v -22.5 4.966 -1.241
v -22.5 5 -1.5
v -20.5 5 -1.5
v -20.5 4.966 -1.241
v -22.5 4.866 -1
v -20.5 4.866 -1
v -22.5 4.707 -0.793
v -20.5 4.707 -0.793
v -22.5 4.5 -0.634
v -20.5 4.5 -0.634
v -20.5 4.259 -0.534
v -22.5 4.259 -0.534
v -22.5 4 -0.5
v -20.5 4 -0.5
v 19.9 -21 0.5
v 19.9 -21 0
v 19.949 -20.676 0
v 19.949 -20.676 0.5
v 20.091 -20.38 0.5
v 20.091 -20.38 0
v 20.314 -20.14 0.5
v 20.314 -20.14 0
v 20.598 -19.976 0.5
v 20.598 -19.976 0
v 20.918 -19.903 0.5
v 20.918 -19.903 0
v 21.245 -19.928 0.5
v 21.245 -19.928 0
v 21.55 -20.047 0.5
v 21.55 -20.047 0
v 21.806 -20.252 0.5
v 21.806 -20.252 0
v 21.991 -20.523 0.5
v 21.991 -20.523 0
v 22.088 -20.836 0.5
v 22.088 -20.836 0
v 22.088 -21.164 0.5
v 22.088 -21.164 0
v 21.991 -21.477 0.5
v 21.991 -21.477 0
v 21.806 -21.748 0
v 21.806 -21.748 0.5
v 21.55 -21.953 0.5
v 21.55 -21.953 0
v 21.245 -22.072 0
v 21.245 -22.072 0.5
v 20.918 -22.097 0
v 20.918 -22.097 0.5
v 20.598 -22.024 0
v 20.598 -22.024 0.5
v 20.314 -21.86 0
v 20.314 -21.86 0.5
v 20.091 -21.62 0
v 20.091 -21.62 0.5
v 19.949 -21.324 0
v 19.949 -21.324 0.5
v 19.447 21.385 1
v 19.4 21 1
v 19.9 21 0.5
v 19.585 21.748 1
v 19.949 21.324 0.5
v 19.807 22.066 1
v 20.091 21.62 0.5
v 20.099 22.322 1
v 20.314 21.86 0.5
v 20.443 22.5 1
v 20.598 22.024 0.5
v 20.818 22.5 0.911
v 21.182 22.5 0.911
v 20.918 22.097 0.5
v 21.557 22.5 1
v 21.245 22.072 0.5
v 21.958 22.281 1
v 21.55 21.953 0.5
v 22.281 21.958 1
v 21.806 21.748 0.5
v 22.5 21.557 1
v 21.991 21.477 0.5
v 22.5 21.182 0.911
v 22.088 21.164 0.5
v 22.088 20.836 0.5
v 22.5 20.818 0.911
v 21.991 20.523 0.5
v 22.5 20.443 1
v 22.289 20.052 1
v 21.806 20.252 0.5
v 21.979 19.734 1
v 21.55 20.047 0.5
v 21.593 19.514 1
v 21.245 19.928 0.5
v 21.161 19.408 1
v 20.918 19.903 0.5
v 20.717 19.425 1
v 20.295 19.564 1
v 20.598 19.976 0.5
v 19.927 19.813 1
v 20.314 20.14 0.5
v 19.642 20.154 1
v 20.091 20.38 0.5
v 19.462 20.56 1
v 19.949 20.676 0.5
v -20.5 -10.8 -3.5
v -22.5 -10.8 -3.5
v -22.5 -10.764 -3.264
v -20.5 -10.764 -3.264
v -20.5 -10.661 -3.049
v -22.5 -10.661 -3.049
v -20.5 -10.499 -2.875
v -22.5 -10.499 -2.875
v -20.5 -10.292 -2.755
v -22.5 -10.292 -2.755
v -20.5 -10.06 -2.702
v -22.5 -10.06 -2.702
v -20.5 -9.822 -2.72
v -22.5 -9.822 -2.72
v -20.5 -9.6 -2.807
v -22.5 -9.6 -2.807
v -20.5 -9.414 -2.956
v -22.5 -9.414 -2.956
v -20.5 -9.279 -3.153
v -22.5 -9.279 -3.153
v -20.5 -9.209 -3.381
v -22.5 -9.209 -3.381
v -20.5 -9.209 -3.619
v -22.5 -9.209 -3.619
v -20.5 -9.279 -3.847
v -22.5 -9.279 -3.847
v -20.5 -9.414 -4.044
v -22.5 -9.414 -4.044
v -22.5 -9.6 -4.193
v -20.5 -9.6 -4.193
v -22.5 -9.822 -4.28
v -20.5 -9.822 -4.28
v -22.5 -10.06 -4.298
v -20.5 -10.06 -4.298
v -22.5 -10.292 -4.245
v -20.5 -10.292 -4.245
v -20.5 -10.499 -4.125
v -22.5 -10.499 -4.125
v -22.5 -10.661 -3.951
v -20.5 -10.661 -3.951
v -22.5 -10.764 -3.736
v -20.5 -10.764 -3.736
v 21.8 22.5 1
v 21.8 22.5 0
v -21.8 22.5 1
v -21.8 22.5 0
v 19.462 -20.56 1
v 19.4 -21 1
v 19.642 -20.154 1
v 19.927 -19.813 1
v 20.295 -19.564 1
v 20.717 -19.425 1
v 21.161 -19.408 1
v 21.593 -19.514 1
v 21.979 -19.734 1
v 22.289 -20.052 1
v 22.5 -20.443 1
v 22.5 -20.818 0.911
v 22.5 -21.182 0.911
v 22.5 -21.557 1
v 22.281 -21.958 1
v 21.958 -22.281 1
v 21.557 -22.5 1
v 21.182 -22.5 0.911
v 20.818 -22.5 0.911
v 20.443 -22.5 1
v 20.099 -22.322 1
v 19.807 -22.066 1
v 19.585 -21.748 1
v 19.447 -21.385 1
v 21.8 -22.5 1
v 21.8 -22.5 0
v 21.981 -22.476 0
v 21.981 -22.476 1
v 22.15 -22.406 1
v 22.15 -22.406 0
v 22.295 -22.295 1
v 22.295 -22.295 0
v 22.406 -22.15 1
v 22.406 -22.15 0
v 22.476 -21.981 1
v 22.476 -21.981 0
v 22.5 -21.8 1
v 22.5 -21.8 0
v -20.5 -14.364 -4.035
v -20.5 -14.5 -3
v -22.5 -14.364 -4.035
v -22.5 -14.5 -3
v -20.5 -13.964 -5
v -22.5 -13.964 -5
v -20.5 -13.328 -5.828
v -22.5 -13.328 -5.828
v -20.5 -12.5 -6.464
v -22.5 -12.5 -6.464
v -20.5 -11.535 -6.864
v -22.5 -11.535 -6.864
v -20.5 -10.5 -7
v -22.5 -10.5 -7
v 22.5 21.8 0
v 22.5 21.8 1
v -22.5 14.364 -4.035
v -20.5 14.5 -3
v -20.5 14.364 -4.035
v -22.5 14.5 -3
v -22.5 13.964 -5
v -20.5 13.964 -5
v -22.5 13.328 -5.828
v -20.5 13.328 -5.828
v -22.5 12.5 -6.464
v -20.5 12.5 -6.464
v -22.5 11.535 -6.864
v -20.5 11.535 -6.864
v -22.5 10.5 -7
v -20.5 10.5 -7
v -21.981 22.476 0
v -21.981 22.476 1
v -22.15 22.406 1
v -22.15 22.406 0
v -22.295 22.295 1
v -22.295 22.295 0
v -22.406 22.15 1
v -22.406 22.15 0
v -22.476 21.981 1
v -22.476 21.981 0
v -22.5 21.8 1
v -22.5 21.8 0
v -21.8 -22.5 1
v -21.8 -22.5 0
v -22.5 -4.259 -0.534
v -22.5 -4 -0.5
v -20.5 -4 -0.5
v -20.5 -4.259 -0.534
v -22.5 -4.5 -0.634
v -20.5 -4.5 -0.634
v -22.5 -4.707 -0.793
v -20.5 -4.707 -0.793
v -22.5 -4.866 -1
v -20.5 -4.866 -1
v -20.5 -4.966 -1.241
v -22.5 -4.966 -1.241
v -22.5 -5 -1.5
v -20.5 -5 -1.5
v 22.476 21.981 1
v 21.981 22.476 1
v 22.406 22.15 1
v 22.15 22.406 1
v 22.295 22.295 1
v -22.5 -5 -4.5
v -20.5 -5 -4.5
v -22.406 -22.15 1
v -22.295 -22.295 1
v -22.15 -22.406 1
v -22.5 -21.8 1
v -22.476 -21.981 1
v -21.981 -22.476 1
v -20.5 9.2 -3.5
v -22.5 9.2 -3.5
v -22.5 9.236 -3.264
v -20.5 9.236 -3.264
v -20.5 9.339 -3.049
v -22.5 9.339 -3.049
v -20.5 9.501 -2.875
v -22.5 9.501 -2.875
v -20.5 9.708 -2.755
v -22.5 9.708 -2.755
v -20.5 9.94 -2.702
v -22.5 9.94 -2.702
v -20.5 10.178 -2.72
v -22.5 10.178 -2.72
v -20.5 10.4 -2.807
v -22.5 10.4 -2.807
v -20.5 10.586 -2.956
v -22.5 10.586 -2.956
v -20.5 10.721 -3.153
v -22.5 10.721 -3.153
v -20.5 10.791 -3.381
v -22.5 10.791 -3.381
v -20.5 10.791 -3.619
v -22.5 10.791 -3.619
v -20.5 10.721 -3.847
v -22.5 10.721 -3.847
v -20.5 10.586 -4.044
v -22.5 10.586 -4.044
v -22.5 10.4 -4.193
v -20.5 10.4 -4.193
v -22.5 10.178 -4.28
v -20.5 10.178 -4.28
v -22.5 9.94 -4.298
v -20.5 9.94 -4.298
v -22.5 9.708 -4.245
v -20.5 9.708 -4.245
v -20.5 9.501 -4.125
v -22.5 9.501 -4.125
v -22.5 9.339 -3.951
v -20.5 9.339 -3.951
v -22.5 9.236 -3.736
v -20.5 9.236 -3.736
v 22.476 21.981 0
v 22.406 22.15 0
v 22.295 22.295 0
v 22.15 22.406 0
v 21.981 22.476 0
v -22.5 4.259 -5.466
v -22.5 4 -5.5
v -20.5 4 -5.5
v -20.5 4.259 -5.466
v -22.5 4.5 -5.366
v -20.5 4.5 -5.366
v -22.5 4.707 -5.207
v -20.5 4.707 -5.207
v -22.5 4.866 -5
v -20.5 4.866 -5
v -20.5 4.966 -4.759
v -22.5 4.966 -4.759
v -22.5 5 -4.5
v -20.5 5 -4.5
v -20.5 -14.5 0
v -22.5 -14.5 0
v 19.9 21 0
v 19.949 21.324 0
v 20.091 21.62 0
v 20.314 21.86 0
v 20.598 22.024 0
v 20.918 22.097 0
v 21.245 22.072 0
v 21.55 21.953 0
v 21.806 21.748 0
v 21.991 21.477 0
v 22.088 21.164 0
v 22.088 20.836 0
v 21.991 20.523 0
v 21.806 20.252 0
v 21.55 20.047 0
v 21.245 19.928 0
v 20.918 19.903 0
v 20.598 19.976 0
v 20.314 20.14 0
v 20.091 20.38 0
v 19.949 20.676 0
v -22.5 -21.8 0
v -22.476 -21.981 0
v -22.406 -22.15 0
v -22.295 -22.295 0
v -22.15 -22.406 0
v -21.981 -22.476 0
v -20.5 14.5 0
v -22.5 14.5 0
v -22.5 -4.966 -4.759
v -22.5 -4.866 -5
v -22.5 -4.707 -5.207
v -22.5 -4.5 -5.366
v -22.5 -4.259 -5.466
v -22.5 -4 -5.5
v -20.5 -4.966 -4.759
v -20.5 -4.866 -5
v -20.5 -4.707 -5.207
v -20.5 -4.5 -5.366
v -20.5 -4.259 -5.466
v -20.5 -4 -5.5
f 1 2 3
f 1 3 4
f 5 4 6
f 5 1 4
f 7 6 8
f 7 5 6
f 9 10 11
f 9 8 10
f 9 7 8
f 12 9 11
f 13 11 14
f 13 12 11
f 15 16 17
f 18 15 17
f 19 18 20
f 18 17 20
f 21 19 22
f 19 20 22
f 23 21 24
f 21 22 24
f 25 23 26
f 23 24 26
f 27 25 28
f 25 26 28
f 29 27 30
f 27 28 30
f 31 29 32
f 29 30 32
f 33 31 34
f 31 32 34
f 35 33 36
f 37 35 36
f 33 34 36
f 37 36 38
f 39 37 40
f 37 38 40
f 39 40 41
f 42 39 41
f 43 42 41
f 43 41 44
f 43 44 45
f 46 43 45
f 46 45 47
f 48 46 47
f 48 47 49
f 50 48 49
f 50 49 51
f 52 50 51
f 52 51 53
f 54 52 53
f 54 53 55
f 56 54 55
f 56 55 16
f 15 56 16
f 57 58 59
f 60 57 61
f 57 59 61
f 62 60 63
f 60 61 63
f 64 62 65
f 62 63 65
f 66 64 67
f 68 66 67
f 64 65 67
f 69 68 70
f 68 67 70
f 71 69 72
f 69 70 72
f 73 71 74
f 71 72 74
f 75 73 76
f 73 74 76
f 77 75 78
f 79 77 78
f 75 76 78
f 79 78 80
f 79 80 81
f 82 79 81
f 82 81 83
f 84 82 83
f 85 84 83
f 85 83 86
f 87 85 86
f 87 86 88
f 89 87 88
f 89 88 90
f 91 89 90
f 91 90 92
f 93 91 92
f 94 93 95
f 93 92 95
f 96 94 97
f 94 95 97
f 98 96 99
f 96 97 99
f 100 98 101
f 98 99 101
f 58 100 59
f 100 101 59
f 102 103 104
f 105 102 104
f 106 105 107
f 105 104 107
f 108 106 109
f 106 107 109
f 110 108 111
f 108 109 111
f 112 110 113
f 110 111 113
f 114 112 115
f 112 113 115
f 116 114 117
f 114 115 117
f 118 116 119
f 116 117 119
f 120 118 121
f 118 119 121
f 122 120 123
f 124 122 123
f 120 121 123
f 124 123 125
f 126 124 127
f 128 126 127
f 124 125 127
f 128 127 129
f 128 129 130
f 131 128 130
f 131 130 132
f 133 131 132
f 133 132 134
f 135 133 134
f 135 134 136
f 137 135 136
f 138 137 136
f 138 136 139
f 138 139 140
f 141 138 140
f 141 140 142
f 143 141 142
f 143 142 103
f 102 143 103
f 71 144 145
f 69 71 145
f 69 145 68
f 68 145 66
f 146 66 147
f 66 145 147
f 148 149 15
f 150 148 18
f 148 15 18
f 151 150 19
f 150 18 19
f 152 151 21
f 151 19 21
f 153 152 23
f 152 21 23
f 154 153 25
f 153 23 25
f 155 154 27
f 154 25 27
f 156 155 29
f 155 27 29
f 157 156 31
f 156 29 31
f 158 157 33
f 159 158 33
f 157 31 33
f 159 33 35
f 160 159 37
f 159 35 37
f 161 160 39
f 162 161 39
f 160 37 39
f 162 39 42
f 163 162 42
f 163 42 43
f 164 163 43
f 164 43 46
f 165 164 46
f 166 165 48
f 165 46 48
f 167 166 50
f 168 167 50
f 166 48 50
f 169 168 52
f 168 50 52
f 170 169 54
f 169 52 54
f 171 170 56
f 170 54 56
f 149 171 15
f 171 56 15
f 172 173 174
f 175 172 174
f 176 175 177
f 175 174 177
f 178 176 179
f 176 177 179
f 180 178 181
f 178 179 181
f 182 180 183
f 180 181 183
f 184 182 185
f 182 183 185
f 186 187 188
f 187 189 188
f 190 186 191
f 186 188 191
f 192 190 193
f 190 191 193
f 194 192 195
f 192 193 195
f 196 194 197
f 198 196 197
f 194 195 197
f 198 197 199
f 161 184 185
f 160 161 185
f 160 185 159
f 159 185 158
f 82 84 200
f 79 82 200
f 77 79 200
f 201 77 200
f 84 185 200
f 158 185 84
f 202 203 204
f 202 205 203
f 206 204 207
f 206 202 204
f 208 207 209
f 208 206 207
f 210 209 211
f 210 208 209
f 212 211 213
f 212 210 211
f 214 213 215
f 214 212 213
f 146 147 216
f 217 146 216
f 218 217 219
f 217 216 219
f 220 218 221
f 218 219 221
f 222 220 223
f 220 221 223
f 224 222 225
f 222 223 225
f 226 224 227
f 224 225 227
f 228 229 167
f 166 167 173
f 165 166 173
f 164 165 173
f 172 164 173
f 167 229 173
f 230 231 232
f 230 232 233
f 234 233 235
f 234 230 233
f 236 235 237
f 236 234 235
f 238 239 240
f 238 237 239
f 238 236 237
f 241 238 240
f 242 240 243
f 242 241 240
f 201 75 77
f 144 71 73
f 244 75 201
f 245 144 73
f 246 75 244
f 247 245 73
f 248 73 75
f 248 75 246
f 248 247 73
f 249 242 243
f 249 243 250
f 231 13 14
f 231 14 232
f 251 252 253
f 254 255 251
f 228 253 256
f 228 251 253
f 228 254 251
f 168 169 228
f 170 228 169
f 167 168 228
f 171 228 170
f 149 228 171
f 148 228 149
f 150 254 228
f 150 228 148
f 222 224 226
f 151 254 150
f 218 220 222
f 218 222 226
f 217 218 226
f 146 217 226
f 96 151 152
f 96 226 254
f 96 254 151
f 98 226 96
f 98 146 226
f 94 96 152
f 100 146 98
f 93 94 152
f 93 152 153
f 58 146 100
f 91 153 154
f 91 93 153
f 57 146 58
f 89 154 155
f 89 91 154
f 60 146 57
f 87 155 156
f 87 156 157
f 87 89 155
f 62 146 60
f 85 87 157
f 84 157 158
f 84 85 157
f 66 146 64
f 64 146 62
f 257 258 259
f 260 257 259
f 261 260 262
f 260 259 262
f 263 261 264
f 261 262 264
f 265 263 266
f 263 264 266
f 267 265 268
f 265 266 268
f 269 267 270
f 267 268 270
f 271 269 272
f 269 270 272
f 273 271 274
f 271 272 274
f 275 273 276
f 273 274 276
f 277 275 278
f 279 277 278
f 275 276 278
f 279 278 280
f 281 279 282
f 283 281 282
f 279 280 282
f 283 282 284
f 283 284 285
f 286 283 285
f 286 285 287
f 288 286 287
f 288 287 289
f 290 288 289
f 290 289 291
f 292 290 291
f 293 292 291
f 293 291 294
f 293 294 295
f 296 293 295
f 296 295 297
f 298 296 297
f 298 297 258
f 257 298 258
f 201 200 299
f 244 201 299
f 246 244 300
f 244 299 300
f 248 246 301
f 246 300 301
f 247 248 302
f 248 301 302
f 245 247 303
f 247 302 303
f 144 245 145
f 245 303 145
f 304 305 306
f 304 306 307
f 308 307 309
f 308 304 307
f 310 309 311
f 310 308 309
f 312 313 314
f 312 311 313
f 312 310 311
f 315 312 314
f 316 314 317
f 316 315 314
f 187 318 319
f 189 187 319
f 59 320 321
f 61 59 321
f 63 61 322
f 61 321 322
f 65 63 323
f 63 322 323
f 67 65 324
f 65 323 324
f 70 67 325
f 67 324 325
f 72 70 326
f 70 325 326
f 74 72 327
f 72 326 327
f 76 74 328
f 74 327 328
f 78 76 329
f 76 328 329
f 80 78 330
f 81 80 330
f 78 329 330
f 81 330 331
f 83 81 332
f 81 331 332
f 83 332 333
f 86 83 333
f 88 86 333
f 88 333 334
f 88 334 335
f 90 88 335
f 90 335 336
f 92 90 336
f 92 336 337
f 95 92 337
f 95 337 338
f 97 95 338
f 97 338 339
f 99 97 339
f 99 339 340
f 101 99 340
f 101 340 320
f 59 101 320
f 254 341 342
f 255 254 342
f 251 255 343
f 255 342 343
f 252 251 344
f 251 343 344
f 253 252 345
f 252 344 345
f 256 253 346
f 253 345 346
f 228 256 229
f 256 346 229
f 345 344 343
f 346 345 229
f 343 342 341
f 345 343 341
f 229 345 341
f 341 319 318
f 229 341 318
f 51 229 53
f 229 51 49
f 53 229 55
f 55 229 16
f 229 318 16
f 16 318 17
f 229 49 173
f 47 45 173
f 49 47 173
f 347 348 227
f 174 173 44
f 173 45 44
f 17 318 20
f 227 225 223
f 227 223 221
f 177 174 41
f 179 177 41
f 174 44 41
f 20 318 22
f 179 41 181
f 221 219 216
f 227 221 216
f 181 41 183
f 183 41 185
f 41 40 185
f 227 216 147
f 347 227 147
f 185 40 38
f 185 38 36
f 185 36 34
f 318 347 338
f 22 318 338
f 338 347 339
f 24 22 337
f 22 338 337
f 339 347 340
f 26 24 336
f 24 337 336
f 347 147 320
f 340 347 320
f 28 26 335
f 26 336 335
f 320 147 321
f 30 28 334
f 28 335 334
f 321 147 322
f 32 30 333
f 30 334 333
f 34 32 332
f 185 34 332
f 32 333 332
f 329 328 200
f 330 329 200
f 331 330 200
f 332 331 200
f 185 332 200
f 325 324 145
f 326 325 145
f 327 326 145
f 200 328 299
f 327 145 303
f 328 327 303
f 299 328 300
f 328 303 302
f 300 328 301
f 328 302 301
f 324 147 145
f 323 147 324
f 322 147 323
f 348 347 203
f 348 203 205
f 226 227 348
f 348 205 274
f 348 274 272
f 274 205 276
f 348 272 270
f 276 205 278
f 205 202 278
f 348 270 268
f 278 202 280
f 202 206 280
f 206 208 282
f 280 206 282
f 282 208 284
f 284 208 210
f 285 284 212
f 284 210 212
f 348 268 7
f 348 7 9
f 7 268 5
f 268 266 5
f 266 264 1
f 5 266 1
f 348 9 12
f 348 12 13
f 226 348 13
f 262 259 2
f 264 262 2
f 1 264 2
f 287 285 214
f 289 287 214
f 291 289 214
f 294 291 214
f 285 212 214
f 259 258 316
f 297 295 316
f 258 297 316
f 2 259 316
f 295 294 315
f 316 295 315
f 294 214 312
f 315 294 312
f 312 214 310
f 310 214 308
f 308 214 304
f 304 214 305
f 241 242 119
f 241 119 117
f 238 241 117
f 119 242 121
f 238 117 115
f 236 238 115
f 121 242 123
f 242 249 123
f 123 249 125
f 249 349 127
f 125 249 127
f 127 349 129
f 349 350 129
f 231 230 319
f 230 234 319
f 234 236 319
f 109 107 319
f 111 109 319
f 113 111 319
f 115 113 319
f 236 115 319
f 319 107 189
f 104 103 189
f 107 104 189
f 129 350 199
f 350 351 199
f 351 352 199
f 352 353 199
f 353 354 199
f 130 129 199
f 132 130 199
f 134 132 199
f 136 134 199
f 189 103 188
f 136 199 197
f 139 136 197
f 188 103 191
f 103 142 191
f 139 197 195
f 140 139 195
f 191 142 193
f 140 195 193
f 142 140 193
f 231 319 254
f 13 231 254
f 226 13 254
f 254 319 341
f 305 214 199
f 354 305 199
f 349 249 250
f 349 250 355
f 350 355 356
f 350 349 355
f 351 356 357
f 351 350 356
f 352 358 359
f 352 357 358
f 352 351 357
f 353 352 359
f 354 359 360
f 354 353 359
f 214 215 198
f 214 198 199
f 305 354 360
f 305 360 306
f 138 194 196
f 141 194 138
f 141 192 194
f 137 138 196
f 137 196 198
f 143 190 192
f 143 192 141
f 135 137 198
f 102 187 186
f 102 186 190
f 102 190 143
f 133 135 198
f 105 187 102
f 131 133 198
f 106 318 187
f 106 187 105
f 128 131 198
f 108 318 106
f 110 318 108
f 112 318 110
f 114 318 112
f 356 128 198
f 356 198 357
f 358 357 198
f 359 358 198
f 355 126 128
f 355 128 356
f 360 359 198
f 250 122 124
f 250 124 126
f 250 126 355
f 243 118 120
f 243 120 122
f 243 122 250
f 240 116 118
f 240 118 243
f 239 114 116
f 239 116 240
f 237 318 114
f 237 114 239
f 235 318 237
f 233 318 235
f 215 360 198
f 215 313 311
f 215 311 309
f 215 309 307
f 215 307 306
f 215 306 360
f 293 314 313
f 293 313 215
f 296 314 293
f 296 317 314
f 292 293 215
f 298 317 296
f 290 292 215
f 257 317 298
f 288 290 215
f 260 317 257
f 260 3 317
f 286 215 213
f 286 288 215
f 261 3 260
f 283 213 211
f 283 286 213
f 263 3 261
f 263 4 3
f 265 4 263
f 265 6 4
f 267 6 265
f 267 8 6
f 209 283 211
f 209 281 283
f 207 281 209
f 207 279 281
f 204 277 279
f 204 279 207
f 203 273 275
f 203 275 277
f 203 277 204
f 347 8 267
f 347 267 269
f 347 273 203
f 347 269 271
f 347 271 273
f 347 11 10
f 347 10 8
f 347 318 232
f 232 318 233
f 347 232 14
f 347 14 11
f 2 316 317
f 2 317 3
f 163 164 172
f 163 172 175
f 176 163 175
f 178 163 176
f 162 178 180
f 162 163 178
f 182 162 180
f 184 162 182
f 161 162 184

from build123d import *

# Parameters (mm, degrees)
EXTRUDE_1_DEPTH     = 1
SKETCH_2_W          = 2
SKETCH_2_H          = 29
EXTRUDE_2_DEPTH     = 7
SKETCH_3_R          = 1.1
CUT_EXTRUDE_1_DEPTH = 7
SKETCH_4_R          = 0.8
CUT_EXTRUDE_2_DEPTH = 7
CHAMFER_1_SIZE      = 0.5
FILLET_1_R          = 4
CUT_EXTRUDE_3_DEPTH = 10


with BuildPart() as part:
    # 草图1 → 凸台-拉伸1 (new body)
    with BuildSketch(Plane.XY):
        with BuildLine():
            Line((22.5, -21.8), (22.5, 21.8))
            ThreePointArc((22.5, 21.8), (22.294974747, 22.294974747), (21.8, 22.5))
            Line((21.8, 22.5), (-21.8, 22.5))
            ThreePointArc((-21.8, 22.5), (-22.294974747, 22.294974747), (-22.5, 21.8))
            Line((-22.5, 21.8), (-22.5, -21.8))
            ThreePointArc((-22.5, -21.8), (-22.294974747, -22.294974747), (-21.8, -22.5))
            Line((-21.8, -22.5), (21.8, -22.5))
            ThreePointArc((21.8, -22.5), (22.294974747, -22.294974747), (22.5, -21.8))
        make_face()
    extrude(amount=EXTRUDE_1_DEPTH)

    # 草图2 → 凸台-拉伸2 (add)
    with BuildSketch(Plane(origin=(0, 0, 0), x_dir=(-1, 0, 0), z_dir=(0, 0, -1))):
        with Locations((21.5, 0)):
            Rectangle(SKETCH_2_W, SKETCH_2_H)
    extrude(amount=EXTRUDE_2_DEPTH)

    # 草图3 → 切除-拉伸1 (cut)
    with BuildSketch(Plane(origin=(0, 0, 0), x_dir=(-1, 0, 0), z_dir=(0, 0, -1))):
        with Locations((-21, 21)):
            Circle(SKETCH_3_R)
        with Locations((-21, -21)):
            Circle(SKETCH_3_R)
    extrude(amount=-CUT_EXTRUDE_1_DEPTH, mode=Mode.SUBTRACT)

    # 草图4 → 切除-拉伸2 (cut)
    with BuildSketch(Plane.ZY.offset(22.5)):
        with Locations(Location((-3.5, 10, 0), (0, 0, 270))):
            Circle(SKETCH_4_R)
        with Locations(Location((-3.5, -10, 0), (0, 0, 270))):
            Circle(SKETCH_4_R)
    extrude(amount=-CUT_EXTRUDE_2_DEPTH, mode=Mode.SUBTRACT)

    # 倒角1
    # the kernel refuses this chamfer: 0.5 mm, written as the material it takes off along each edge
    with BuildSketch(Plane(origin=(21, 21, 1), x_dir=(-1, 0, 0), z_dir=(0, -1, 0))) as chamfer_1_piece_1:
        Polygon((1.1 + CHAMFER_1_SIZE, 0), (1.1, CHAMFER_1_SIZE), (1.1, 0), align=None)
    revolve(axis=Axis((21, 21, 1), (0, 0, -1)), mode=Mode.SUBTRACT)
    with BuildSketch(Plane(origin=(21, -21, 1), x_dir=(-1, 0, 0), z_dir=(0, -1, 0))) as chamfer_1_piece_2:
        Polygon((1.1 + CHAMFER_1_SIZE, 0), (1.1, CHAMFER_1_SIZE), (1.1, 0), align=None)
    revolve(axis=Axis((21, -21, 1), (0, 0, -1)), mode=Mode.SUBTRACT)

    # 圆角1
    fillet_1_edges = [part.edges().sort_by_distance(p)[0] for p in [
        (-21.5, 14.5, -7),
        (-21.5, -14.5, -7),
    ]]
    fillet(fillet_1_edges, radius=FILLET_1_R)

    # 草图5 → 切除-拉伸3 (cut)
    with BuildSketch(Plane.ZY.offset(22.5)):
        with BuildLine():
            Line((-4.5, 5), (-1.5, 5))
            ThreePointArc((-1.5, 5), (-0.792893219, 4.707106781), (-0.5, 4))
            Line((-0.5, 4), (-0.5, -4))
            ThreePointArc((-0.5, -4), (-0.792893219, -4.707106781), (-1.5, -5))
            Line((-1.5, -5), (-4.5, -5))
            ThreePointArc((-4.5, -5), (-5.207106781, -4.707106781), (-5.5, -4))
            Line((-5.5, -4), (-5.5, 4))
            ThreePointArc((-5.5, 4), (-5.207106781, 4.707106781), (-4.5, 5))
        make_face()
    extrude(amount=-CUT_EXTRUDE_3_DEPTH, mode=Mode.SUBTRACT)


solid = part.part
